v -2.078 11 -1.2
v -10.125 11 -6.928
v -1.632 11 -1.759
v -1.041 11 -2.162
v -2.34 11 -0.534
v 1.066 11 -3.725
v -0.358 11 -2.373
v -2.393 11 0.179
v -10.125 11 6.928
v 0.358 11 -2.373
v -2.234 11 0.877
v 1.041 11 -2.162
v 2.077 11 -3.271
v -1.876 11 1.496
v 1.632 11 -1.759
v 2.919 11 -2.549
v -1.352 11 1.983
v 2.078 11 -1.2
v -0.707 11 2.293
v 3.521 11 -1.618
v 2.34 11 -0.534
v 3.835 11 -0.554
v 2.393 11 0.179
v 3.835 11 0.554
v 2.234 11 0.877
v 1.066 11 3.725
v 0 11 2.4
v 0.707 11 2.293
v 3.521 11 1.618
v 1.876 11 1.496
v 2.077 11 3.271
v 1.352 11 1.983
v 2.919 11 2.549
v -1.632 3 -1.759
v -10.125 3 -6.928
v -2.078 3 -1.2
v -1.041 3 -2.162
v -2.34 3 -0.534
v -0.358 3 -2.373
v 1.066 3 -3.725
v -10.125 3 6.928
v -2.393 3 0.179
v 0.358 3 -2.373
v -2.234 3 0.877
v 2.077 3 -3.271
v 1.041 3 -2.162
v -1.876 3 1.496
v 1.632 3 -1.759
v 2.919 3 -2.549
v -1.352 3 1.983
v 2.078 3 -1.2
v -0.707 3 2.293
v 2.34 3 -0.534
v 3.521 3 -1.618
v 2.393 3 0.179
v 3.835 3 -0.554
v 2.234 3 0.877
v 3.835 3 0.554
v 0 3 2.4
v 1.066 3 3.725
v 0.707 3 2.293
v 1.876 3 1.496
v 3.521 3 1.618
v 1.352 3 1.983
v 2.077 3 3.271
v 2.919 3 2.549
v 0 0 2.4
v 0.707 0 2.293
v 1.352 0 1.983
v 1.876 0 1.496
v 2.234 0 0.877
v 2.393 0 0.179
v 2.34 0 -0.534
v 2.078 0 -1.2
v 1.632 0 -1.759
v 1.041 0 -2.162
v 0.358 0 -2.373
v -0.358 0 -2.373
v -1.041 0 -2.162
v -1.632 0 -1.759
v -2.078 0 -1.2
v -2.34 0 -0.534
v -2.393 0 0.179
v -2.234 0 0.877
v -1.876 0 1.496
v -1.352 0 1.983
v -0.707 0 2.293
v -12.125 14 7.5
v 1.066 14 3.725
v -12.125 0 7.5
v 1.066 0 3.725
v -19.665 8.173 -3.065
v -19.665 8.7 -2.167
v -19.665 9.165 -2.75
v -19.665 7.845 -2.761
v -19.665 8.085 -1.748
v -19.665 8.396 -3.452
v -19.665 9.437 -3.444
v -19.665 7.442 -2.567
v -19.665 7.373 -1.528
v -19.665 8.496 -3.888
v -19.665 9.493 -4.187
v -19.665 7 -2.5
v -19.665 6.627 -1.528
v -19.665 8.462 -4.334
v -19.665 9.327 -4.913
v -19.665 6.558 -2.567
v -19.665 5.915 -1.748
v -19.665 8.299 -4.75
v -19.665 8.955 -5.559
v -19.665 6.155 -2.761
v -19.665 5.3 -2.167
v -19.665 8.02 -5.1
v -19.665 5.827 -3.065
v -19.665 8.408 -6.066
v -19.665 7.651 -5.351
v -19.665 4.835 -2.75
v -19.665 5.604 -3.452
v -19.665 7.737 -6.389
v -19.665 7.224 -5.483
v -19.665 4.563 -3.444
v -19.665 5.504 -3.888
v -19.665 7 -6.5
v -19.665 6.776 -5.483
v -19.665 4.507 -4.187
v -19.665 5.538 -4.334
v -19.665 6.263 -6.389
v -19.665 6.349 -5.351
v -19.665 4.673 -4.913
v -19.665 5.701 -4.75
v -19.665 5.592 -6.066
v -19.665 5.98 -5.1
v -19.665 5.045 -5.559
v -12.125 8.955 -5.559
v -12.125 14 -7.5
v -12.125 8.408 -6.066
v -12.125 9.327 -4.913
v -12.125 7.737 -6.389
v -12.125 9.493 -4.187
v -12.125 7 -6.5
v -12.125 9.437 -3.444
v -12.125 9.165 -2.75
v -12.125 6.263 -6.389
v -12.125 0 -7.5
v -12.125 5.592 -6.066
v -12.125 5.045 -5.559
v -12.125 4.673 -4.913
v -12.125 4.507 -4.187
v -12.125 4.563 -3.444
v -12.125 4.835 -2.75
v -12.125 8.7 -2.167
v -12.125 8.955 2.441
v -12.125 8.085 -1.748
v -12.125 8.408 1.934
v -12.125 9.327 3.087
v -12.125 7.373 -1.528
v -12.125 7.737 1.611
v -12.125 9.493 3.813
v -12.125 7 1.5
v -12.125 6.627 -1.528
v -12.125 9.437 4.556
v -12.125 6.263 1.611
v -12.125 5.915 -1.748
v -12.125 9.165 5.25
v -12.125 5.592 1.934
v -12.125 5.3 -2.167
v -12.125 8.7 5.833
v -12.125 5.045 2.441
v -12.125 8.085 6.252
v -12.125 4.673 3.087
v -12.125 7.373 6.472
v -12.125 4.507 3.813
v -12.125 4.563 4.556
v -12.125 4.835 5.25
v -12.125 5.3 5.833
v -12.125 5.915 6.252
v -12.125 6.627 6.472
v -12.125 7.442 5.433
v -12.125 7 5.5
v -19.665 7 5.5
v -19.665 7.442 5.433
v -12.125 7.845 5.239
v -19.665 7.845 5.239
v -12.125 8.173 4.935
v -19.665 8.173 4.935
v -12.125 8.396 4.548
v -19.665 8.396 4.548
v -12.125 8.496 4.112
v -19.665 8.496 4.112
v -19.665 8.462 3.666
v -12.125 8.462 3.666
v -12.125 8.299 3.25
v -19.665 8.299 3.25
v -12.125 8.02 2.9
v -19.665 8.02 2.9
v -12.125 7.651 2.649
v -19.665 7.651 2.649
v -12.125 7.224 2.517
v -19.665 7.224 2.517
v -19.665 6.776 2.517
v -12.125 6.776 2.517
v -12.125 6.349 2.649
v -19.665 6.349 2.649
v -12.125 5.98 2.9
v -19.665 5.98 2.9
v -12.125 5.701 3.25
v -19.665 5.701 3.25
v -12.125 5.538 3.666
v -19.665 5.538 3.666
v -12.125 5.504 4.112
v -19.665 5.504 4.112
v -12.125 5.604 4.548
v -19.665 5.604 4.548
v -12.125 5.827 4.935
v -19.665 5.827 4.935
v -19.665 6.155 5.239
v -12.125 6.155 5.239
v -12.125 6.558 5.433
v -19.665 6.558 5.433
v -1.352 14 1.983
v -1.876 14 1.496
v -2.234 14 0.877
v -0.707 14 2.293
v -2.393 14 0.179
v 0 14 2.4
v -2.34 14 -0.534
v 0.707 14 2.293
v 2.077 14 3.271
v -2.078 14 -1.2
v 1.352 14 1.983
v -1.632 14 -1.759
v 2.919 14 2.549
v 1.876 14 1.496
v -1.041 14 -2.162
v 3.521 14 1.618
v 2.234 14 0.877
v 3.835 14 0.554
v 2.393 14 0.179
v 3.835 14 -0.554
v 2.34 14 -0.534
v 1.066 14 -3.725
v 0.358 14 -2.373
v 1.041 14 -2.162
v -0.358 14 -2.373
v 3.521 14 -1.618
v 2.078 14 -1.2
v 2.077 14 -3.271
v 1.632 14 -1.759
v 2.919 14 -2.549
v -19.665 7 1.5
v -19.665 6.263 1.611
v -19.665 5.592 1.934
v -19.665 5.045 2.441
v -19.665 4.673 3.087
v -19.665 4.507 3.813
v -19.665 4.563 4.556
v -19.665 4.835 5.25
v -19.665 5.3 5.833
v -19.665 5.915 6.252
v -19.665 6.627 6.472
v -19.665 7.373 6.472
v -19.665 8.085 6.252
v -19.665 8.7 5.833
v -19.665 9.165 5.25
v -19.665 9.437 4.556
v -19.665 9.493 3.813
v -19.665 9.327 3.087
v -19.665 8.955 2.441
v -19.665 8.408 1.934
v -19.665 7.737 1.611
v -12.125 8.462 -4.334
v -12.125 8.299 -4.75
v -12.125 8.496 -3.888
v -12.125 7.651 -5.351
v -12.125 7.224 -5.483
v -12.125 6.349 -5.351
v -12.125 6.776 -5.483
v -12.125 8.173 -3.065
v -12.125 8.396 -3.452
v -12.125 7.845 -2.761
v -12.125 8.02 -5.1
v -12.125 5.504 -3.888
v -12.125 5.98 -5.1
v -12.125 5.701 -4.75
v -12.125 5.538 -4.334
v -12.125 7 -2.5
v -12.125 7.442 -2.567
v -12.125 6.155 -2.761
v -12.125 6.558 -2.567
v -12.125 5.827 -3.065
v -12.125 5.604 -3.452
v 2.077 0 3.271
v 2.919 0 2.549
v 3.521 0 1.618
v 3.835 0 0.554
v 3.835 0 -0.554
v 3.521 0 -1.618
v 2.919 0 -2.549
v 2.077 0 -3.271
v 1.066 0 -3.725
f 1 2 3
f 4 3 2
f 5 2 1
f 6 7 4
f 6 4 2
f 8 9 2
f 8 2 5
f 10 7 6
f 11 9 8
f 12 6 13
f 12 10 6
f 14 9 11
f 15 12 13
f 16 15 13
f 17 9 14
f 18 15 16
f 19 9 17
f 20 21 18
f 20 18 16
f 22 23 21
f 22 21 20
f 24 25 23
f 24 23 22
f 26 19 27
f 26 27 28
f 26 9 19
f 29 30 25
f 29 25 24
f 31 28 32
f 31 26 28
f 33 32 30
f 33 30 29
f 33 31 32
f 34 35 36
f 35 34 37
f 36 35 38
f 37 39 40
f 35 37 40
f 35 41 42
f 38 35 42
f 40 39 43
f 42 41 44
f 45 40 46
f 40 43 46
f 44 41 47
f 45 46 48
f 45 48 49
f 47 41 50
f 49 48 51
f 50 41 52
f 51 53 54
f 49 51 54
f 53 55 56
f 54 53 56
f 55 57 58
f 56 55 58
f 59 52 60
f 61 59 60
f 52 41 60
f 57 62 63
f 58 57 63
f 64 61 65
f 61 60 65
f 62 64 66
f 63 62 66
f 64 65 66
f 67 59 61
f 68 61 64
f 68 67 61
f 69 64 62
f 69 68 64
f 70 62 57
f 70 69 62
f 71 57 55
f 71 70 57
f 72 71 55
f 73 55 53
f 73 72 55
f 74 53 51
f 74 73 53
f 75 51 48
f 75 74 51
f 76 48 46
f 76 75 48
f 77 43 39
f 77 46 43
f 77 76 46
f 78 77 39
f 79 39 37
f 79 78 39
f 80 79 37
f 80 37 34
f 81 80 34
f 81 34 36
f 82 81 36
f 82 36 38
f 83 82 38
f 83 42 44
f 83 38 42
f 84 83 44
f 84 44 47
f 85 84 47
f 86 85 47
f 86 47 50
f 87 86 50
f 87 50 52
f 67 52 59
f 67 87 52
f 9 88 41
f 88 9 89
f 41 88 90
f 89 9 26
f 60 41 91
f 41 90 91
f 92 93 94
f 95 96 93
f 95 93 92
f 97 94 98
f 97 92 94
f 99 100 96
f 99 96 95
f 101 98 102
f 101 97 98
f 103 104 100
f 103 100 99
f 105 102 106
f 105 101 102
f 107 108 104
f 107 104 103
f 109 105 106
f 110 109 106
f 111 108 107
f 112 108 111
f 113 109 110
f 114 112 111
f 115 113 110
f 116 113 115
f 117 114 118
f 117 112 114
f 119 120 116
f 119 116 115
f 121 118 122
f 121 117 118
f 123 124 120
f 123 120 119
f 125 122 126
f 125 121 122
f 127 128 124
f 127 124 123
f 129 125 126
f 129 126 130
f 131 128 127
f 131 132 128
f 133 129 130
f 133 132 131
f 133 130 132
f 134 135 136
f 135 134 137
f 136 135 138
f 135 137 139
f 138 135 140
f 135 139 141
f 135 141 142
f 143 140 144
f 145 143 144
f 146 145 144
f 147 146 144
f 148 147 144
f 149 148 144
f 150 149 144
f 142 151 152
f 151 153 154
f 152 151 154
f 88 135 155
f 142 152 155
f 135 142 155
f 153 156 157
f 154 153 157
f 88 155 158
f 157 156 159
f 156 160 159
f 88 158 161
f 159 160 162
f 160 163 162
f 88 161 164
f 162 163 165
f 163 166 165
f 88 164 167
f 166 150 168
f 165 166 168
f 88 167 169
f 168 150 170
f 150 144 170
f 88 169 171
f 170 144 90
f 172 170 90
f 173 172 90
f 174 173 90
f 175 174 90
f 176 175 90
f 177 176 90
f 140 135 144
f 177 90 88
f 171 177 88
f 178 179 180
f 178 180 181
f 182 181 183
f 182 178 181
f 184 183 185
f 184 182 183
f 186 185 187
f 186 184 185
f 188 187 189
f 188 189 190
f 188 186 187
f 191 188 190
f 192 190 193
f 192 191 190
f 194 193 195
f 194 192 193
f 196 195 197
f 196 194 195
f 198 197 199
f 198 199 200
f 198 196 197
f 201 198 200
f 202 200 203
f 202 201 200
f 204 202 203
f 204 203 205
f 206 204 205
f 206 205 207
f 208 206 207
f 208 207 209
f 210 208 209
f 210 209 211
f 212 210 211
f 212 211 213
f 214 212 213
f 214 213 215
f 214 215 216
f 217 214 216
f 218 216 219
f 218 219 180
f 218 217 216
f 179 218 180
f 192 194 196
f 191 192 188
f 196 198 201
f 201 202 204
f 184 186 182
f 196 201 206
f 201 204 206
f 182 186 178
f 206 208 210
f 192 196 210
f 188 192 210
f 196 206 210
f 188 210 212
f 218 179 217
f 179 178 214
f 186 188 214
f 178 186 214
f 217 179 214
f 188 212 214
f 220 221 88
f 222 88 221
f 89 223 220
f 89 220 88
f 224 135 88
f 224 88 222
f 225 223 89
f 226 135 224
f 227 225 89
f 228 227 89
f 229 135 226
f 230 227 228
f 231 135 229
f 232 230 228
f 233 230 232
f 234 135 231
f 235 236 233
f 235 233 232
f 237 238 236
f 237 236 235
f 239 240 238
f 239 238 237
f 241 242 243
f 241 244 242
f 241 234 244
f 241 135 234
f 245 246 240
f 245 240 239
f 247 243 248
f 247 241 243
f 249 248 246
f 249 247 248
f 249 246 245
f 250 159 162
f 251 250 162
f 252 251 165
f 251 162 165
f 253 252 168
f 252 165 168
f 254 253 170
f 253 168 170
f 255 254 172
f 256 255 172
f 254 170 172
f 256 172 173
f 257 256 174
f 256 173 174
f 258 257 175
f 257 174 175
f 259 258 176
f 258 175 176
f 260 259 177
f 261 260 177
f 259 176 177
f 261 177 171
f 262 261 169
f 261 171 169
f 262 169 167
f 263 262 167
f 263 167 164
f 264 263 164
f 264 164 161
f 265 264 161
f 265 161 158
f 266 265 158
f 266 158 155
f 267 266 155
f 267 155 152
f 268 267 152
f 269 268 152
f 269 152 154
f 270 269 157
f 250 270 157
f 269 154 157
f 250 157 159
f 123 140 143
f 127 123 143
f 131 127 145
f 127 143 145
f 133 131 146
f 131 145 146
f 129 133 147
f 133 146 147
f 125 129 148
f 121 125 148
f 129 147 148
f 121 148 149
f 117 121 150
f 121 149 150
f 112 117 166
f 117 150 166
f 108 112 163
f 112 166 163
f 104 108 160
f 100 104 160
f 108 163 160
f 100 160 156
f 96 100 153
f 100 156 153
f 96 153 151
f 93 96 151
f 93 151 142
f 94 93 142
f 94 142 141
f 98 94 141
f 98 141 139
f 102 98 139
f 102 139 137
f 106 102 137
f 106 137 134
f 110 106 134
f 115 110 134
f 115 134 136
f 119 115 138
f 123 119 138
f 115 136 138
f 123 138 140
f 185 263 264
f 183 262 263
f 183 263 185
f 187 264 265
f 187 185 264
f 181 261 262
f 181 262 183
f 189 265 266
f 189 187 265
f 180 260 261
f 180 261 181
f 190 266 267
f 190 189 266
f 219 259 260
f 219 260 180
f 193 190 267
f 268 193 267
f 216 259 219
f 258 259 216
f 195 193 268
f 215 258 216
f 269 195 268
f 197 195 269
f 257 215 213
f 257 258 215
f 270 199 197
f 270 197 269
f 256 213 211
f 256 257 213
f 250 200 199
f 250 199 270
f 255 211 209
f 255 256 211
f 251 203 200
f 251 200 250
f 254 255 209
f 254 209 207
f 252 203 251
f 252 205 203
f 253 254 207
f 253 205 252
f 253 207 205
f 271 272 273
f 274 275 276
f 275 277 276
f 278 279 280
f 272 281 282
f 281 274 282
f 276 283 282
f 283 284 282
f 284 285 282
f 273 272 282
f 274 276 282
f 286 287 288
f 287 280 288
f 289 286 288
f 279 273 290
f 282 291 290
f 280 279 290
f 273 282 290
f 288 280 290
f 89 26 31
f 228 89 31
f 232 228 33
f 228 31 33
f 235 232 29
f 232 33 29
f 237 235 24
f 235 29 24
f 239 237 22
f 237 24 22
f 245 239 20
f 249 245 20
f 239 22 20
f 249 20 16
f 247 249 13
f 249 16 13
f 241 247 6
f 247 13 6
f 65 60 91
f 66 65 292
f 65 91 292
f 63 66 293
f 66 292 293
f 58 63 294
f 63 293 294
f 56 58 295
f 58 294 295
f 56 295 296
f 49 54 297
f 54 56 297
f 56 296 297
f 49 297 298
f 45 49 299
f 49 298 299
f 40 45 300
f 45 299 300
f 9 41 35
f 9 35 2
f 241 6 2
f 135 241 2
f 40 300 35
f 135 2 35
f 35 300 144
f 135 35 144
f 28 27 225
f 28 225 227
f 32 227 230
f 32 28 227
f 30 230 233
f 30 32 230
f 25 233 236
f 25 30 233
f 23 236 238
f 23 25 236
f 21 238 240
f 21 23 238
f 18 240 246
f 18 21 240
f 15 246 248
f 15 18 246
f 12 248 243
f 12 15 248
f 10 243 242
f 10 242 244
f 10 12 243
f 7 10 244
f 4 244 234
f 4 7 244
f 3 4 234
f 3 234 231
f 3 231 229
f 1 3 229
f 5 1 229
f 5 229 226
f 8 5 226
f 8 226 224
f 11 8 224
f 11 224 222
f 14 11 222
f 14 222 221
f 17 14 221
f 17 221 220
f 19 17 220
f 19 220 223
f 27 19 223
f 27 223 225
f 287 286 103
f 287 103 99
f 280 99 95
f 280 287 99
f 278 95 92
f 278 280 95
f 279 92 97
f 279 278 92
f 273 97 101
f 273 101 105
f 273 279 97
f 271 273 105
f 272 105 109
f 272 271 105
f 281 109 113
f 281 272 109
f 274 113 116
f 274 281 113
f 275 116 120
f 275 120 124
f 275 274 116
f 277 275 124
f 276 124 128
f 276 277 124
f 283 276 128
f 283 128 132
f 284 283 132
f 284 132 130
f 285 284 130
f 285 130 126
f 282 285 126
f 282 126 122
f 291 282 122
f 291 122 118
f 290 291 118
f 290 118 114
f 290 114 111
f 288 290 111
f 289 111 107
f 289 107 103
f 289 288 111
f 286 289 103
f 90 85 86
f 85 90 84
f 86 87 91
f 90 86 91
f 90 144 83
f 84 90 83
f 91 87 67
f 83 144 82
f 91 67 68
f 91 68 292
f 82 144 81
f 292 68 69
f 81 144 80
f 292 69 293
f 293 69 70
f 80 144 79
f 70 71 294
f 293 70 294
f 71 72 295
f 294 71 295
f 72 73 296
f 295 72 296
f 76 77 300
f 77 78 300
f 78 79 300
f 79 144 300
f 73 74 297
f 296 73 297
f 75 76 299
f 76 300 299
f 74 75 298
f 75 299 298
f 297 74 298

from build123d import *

# Parameters (mm, degrees)
SKETCH1_R           = 2.4
BOSS_EXTRUDE1_DEPTH = 14
SKETCH3_W           = 16.77722104
SKETCH3_H           = 8
CUT_EXTRUDE2_DEPTH  = 26
SKETCH4_R           = 2.5
SKETCH4_R_2         = 1.5
BOSS_EXTRUDE2_DEPTH = 7.54


with BuildPart() as part:
    # Sketch1 → Boss-Extrude1 (new body)
    with BuildSketch(Plane(origin=(0, 0, 0), x_dir=(1, 0, 0), z_dir=(0, 1, 0))):
        with BuildLine():
            Line((-12.125, 7.5), (-12.125, -7.5))
            Line((-12.125, -7.5), (1.066020546, -3.725483216))
            ThreePointArc((1.066020546, -3.725483216), (3.875, 0), (1.066020546, 3.725483216))
            Line((1.066020546, 3.725483216), (-12.125, 7.5))
        make_face()
        with Locations(Location((0, 0, 0), (0, 0, 270))):
            Circle(SKETCH1_R, mode=Mode.SUBTRACT)
    extrude(amount=BOSS_EXTRUDE1_DEPTH)

    # Sketch3 → Cut-Extrude2 (cut, symmetric)
    with BuildSketch(Plane.XY):
        with Locations((-1.73638948, 7)):
            Rectangle(SKETCH3_W, SKETCH3_H)
    extrude(amount=CUT_EXTRUDE2_DEPTH, both=True, mode=Mode.SUBTRACT)

    # Sketch4 → Boss-Extrude2 (add)
    # profile 1 of 2: a face of its own
    with BuildSketch(Plane.ZY.offset(12.125)):
        with Locations(Location((4, 7, 0), (0, 0, 180))):
            Circle(SKETCH4_R)
        with Locations((4, 7)):
            Circle(SKETCH4_R_2, mode=Mode.SUBTRACT)
    # profile 2 of 2: a face of its own
    with BuildSketch(Plane.ZY.offset(12.125)):
        with Locations(Location((-4, 7, 0), (0, 0, 180))):
            Circle(SKETCH4_R)
        with Locations((-4, 7)):
            Circle(SKETCH4_R_2, mode=Mode.SUBTRACT)
    extrude(amount=BOSS_EXTRUDE2_DEPTH)


solid = part.part
